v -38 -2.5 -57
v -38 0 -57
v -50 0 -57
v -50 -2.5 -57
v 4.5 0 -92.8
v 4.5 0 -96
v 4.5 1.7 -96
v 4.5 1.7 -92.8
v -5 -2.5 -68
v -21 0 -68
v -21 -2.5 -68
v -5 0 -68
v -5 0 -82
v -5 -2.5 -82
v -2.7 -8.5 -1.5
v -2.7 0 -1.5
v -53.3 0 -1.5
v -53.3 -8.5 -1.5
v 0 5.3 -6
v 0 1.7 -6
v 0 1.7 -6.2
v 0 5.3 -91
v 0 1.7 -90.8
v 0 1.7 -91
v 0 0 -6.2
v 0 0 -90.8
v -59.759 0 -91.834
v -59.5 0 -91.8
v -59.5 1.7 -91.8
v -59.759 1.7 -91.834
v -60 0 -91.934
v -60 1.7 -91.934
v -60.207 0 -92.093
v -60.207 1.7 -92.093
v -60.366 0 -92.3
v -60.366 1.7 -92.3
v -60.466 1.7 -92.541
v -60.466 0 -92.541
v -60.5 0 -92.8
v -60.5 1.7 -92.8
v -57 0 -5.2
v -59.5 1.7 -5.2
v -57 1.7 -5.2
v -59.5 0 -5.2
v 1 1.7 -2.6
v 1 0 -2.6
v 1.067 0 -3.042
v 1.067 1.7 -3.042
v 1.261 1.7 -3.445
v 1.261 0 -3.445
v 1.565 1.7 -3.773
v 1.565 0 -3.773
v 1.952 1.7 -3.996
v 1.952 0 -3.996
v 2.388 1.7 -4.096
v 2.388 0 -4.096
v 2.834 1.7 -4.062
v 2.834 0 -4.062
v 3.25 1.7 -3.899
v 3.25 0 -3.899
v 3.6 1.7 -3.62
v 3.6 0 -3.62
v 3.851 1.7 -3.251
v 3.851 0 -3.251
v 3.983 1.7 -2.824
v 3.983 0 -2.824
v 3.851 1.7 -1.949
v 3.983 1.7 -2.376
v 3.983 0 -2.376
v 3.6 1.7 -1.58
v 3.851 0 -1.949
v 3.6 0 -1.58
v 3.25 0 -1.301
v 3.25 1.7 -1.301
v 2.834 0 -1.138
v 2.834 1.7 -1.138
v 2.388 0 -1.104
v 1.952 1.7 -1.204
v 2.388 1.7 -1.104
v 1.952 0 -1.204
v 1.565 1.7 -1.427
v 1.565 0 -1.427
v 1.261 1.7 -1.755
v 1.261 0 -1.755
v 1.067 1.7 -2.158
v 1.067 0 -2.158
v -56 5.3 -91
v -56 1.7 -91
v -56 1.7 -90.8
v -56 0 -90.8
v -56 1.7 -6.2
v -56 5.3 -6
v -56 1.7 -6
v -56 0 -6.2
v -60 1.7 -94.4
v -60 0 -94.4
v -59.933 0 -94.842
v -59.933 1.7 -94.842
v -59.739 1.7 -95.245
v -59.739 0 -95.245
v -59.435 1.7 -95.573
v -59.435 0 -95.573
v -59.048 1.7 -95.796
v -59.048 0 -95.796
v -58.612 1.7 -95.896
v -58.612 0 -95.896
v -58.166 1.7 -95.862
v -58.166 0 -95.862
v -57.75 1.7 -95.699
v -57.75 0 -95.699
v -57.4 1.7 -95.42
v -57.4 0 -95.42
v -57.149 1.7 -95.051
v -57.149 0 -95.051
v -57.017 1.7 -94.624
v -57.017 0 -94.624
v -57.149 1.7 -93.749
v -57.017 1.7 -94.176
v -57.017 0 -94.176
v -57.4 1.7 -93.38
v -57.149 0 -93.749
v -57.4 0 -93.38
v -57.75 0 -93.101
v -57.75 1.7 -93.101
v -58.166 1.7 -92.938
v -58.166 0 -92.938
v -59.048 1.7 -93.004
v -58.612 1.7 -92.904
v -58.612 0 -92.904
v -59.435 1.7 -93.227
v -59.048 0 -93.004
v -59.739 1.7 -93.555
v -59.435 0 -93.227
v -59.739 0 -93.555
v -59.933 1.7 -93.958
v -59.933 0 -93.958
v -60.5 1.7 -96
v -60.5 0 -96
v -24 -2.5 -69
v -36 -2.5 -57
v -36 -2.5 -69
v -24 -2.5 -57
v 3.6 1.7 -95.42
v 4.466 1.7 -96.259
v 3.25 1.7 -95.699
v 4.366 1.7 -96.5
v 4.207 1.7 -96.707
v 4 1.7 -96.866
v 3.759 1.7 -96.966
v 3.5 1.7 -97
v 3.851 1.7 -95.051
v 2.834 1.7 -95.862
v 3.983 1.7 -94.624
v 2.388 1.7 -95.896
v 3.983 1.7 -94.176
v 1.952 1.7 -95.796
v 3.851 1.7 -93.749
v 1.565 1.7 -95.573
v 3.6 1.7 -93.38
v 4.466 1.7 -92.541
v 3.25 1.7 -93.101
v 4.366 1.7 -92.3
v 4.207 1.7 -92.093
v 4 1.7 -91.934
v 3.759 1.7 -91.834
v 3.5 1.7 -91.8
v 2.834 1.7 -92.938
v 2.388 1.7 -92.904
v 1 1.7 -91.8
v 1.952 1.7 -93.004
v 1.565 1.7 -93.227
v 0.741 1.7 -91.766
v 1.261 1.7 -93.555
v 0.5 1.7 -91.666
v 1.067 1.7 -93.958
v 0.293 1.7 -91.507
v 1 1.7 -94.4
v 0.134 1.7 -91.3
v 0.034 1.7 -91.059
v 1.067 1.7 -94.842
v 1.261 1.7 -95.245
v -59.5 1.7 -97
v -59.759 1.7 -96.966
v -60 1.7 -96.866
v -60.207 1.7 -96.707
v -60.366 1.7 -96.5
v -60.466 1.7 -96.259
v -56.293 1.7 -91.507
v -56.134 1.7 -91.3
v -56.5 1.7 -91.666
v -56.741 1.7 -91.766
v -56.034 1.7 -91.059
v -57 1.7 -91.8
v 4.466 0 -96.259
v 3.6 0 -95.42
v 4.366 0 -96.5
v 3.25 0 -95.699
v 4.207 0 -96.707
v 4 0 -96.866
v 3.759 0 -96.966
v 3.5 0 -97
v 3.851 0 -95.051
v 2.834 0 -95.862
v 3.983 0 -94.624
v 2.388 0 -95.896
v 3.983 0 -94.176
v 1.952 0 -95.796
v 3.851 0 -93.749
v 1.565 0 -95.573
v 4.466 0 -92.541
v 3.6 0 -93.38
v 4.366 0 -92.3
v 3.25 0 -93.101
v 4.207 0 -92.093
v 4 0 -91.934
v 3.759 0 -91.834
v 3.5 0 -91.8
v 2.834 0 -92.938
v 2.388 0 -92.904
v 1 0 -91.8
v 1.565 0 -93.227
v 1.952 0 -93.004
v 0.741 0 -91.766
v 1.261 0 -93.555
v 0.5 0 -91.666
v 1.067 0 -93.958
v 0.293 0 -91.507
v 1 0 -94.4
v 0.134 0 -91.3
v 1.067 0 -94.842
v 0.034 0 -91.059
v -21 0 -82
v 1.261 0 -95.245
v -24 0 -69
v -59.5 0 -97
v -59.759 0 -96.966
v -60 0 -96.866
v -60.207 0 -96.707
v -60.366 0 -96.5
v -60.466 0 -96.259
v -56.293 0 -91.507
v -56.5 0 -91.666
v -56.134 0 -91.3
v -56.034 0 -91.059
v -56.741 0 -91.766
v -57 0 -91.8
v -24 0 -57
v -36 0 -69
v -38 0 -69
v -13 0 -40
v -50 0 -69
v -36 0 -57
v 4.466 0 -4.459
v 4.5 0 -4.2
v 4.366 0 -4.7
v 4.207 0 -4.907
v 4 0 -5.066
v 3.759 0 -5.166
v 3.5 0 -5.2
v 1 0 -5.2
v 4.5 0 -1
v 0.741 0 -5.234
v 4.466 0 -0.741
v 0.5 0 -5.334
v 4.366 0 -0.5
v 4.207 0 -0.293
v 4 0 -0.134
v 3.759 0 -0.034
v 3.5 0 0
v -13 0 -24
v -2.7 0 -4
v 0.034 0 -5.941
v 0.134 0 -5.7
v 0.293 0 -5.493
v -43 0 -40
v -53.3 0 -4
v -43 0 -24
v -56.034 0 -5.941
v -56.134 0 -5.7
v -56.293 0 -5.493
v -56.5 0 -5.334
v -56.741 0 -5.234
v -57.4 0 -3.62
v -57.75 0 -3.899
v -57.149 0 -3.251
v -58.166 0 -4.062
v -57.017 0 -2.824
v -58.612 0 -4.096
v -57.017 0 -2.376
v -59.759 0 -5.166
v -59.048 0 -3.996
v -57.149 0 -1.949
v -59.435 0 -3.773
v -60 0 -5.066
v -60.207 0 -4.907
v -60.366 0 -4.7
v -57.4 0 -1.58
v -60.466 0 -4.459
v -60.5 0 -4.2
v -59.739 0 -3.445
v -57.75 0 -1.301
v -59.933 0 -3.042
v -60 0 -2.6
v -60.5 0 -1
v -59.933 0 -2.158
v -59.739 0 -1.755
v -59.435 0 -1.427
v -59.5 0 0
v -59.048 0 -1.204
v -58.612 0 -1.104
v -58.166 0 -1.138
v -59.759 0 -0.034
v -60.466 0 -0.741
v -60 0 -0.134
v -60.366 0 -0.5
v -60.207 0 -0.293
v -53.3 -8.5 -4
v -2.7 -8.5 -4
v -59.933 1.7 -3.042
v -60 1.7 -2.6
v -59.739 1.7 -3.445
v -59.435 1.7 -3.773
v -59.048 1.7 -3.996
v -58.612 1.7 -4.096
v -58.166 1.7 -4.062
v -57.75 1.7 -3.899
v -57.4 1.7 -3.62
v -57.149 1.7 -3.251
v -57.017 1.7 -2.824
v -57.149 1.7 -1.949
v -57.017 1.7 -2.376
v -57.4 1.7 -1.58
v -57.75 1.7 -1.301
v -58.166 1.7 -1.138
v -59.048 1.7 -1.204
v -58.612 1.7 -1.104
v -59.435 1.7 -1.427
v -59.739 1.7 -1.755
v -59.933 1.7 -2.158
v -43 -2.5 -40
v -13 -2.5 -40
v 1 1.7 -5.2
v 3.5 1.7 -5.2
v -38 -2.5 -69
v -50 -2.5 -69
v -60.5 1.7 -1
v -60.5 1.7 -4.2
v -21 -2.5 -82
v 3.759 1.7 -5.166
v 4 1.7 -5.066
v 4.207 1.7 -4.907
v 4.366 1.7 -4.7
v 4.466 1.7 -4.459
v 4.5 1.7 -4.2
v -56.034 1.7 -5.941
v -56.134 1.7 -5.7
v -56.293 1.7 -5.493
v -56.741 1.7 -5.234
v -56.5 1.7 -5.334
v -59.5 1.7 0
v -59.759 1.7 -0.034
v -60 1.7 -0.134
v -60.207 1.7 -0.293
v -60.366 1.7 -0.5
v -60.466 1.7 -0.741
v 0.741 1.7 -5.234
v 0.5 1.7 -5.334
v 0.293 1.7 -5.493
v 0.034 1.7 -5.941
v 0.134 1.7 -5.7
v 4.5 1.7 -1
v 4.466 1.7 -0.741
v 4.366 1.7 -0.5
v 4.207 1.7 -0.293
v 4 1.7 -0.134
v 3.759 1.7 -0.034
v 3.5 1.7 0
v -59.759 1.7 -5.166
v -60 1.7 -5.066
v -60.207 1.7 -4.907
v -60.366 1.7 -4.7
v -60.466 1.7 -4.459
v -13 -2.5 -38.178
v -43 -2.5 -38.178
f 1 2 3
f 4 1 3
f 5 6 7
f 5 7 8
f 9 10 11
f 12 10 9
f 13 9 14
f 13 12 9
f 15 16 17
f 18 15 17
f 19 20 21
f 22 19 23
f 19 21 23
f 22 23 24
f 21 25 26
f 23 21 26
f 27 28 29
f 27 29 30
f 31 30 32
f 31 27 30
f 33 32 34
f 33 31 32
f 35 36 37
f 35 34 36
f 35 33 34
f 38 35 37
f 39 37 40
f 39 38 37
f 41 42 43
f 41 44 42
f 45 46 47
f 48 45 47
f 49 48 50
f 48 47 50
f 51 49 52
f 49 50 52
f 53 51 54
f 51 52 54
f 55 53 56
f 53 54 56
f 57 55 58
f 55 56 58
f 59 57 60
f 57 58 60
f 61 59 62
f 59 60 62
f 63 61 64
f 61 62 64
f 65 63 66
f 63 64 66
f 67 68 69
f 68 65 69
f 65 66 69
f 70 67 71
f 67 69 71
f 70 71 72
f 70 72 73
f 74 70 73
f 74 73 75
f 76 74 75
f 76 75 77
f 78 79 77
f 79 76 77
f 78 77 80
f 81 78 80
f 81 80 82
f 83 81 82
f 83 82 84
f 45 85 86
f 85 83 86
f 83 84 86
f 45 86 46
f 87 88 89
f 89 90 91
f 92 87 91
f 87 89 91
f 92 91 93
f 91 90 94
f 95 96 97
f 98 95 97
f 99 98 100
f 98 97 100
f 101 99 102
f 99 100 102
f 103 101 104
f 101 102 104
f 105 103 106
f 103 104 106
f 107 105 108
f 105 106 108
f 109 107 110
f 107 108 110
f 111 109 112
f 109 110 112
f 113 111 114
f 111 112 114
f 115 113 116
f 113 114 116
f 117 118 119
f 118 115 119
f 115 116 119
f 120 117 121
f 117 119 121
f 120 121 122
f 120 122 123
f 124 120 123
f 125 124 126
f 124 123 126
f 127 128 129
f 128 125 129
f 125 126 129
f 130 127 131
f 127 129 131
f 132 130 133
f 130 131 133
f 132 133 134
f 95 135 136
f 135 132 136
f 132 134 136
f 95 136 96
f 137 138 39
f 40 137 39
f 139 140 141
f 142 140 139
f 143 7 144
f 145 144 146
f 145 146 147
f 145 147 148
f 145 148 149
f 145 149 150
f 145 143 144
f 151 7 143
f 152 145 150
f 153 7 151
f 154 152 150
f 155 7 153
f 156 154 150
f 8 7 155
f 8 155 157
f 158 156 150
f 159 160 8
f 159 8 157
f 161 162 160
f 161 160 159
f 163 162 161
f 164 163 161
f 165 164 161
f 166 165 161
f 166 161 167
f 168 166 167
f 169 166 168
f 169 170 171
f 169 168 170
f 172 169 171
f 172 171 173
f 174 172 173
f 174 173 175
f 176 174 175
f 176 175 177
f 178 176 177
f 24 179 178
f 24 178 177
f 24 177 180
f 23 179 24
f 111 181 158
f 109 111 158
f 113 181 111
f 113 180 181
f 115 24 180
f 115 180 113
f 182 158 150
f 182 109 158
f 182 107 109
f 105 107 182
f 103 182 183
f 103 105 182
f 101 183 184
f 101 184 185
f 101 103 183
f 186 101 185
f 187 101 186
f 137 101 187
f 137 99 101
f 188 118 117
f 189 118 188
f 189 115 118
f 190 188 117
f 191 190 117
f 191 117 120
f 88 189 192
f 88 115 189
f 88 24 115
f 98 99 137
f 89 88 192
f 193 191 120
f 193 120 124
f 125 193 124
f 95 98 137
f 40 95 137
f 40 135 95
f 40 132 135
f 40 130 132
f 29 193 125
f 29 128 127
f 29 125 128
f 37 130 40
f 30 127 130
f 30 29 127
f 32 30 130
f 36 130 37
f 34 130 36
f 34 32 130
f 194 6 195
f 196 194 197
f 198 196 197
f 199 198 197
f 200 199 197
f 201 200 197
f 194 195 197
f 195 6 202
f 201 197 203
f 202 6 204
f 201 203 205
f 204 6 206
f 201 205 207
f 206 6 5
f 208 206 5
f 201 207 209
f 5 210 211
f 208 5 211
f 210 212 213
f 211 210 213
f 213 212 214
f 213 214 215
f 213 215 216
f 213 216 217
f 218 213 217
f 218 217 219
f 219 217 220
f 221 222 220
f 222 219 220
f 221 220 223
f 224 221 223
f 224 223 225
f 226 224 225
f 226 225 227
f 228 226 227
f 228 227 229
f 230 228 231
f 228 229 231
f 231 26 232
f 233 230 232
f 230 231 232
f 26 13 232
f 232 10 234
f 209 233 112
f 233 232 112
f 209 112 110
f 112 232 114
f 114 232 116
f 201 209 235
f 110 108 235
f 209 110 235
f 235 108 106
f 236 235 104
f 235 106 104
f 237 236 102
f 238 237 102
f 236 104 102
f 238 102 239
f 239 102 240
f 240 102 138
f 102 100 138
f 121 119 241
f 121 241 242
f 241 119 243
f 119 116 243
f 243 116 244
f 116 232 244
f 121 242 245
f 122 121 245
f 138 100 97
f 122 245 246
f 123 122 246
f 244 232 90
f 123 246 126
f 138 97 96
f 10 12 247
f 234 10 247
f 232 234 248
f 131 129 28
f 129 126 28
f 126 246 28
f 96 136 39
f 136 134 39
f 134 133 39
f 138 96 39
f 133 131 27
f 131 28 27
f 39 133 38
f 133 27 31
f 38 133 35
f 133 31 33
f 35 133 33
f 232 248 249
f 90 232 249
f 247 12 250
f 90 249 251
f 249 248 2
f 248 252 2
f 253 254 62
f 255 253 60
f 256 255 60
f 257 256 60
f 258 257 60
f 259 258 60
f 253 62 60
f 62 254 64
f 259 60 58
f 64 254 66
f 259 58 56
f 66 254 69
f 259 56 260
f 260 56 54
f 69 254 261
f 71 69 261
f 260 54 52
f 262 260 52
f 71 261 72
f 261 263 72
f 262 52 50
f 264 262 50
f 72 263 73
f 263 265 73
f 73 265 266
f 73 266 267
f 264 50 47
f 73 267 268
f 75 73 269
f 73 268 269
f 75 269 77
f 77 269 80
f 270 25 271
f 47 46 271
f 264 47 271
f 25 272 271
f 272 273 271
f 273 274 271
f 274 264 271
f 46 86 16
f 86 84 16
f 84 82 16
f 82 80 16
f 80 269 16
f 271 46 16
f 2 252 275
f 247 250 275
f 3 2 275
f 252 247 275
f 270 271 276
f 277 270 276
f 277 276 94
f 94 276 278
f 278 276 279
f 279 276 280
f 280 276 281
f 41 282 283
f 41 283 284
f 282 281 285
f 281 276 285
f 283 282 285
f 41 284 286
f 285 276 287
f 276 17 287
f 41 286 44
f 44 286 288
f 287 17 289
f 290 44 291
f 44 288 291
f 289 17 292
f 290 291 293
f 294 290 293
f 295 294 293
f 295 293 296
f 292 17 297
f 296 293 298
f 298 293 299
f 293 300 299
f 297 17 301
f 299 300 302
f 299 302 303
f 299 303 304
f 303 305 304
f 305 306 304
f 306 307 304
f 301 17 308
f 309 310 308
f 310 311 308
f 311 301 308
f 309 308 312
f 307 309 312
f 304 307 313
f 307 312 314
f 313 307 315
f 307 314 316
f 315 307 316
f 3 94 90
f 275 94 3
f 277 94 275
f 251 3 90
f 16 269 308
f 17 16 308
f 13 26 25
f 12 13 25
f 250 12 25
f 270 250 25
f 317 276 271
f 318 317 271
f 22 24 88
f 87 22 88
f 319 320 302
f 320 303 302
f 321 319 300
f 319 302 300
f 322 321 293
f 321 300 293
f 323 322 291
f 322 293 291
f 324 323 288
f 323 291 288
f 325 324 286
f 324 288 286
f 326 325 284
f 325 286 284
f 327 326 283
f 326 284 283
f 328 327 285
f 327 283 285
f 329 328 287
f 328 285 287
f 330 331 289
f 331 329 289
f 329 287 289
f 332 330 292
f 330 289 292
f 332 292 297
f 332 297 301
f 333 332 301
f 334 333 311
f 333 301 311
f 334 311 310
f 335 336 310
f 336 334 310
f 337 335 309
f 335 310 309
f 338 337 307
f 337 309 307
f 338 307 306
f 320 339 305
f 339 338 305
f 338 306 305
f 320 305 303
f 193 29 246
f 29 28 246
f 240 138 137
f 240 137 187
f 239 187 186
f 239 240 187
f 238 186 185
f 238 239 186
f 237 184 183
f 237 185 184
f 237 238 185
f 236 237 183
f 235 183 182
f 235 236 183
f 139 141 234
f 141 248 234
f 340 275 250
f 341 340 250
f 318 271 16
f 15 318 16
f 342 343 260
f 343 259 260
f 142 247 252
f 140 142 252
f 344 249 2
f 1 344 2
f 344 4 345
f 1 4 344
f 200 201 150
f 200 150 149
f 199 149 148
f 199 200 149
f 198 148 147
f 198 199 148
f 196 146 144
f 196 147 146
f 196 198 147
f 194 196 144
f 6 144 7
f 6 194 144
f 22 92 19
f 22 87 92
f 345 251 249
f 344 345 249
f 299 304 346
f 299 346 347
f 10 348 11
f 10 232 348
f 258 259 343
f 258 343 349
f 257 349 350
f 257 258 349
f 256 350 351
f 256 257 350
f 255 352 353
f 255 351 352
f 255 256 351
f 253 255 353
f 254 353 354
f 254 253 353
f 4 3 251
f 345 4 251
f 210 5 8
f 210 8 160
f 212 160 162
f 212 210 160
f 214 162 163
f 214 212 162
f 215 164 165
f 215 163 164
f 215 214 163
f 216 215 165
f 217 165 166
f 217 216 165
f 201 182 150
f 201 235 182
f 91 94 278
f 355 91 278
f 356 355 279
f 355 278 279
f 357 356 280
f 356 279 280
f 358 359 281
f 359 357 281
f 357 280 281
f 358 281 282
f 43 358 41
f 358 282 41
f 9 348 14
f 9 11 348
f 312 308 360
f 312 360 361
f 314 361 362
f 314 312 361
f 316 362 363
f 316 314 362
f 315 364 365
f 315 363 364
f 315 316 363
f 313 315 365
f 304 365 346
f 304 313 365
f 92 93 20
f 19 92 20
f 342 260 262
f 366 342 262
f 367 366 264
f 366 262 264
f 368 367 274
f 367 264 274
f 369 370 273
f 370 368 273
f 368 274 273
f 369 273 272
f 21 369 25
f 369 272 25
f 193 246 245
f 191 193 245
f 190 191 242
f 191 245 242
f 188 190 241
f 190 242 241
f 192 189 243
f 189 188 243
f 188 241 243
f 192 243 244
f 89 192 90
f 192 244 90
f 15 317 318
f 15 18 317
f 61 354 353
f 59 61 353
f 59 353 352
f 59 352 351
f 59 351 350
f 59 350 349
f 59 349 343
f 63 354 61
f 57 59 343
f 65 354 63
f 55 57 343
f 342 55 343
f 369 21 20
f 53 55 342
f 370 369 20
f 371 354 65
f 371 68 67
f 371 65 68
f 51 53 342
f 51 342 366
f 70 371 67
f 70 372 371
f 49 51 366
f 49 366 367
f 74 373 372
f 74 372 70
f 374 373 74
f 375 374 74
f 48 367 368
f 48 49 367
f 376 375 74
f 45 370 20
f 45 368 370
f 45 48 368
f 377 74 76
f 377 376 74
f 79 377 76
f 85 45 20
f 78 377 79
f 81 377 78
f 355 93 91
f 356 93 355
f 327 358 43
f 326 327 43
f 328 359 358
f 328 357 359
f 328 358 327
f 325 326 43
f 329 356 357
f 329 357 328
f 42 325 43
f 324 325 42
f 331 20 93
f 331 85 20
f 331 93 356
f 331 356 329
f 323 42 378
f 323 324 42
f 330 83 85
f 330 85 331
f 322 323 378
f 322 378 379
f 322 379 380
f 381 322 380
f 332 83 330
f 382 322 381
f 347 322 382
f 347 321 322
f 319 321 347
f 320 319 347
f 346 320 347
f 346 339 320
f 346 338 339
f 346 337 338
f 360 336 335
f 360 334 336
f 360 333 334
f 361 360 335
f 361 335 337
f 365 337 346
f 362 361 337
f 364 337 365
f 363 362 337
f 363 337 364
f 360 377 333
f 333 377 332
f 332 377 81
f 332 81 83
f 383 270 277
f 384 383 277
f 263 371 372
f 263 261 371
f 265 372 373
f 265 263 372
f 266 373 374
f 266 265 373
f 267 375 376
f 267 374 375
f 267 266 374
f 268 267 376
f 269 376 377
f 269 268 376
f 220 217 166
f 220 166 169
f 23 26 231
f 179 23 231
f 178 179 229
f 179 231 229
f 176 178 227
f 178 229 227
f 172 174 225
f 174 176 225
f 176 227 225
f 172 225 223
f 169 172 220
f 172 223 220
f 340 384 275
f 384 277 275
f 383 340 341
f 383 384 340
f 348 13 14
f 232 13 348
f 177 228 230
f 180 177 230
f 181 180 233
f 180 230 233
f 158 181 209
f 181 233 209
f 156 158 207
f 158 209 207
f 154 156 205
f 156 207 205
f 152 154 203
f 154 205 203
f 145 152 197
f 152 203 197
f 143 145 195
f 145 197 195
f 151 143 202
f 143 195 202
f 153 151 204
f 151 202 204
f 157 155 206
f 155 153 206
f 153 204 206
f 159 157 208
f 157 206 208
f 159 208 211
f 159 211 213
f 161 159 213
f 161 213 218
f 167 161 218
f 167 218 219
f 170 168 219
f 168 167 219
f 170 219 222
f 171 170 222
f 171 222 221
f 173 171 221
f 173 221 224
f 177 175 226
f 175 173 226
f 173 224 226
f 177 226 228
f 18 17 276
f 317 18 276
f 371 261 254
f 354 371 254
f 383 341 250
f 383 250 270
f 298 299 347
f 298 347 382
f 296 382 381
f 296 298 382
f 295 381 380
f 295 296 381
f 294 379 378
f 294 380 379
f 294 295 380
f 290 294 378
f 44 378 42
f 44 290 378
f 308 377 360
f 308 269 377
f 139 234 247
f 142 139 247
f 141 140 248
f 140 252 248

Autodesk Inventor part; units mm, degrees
ref_plane "YZ Plane" through (0, 0, 0) normal (1, 0, 0) x (0, 1, 0)
ref_plane "XZ Plane" through (0, 0, 0) normal (0, 1, 0) x (-1, 0, 0)
ref_plane "XY Plane" through (0, 0, 0) normal (0, 0, 1) x (1, 0, 0)
sketch "Sketch1" plane through (0, 0, 0) normal (0, 1, 0) x (-1, 0, 0)
  line L0 (0, 0) -> (56, 0)
  line L1 (56, -6.2) -> (56, -90.8)
  line L2 (56, -97) -> (0, -97)
  line L3 (0, -90.8) -> (0, -6.2)
  line L4 (0, 0) -> (-3.5, 0)
  line L5 (-4.5, -1) -> (-4.5, -4.2)
  line L6 (-3.5, -5.2) -> (-1, -5.2)
  line L7 (28, 0) -> (28, -97)
  circle A0 centre (-2.5, -2.6) radius 1.5
  arc A1 (-3.5, 0) -> (-4.5, -1) centre (-3.5, -1) ccw
  arc A2 (-4.5, -4.2) -> (-3.5, -5.2) centre (-3.5, -4.2) ccw
  arc A3 (0, -6.2) -> (-1, -5.2) centre (-1, -6.2) ccw
  line L8 (56, 0) -> (59.5, 0)
  line L9 (60.5, -1) -> (60.5, -4.2)
  line L10 (59.5, -5.2) -> (57, -5.2)
  circle A4 centre (58.5, -2.6) radius 1.5
  arc A5 (60.5, -1) -> (59.5, 0) centre (59.5, -1) ccw
  arc A6 (59.5, -5.2) -> (60.5, -4.2) centre (59.5, -4.2) ccw
  arc A7 (57, -5.2) -> (56, -6.2) centre (57, -6.2) ccw
  line L11 (56, -48.5) -> (0, -48.5)
  line L12 (0, -97) -> (-3.5, -97)
  line L13 (-4.5, -96) -> (-4.5, -92.8)
  line L14 (-3.5, -91.8) -> (-1, -91.8)
  circle A8 centre (-2.5, -94.4) radius 1.5
  arc A9 (-4.5, -96) -> (-3.5, -97) centre (-3.5, -96) ccw
  arc A10 (-3.5, -91.8) -> (-4.5, -92.8) centre (-3.5, -92.8) ccw
  arc A11 (-1, -91.8) -> (0, -90.8) centre (-1, -90.8) ccw
  arc A12 (56, -90.8) -> (57, -91.8) centre (57, -90.8) ccw
  line L15 (59.5, -91.8) -> (57, -91.8)
  line L16 (56, -97) -> (59.5, -97)
  circle A13 centre (58.5, -94.4) radius 1.5
  arc A14 (60.5, -92.8) -> (59.5, -91.8) centre (59.5, -92.8) ccw
  line L17 (60.5, -96) -> (60.5, -92.8)
  arc A15 (59.5, -97) -> (60.5, -96) centre (59.5, -96) ccw
  point P0 (-4.5, 0)
  point P1 (-4.5, -5.2)
  point P2 (0, -5.2)
  point P3 (60.5, 0)
  point P4 (60.5, -5.2)
  point P5 (56, -5.2)
  point P6 (-4.5, -97)
  point P7 (-4.5, -91.8)
  point P8 (0, -91.8)
  point P9 (56, -91.8)
  point P10 (60.5, -91.8)
  point P11 (60.5, -97)
  dimension "d0" = 56
  dimension "d1" = 97
  dimension "d2" = 4.5
  dimension "d3" = 5.2
  dimension "d10" = 1
  dimension "d11" = 1
  dimension "d12" = 2
  dimension "d13" = 2.6
  dimension "d14" = 3
  dimension "d15" = 56
extrude "Vetronite" add sketch "Sketch1" along normal blind 1.7
sketch "Sketch2" plane through (0, 1.7, 0) normal (0, 1, 0) x (1, 0, 0)
  line L0 (-59.5, 0) -> (3.5, 0) projected
  line L1 (-28, 0) -> (-28, 97)
  line L2 (3.5, 97) -> (-59.5, 97) projected
  line L3 (-56, 90.8) -> (-56, 6.2) projected
  line L4 (-56, 48.5) -> (0, 48.5)
  line L5 (0, 6.2) -> (0, 90.8) projected
  line L6 (-56, 6) -> (0, 6)
  line L7 (0, 6) -> (0, 91)
  line L8 (0, 91) -> (-56, 91)
  line L9 (-56, 91) -> (-56, 6)
  point P0 (0, 0)
  point P1 (-56, 6.2)
  dimension "d16" = 85
  dimension "d17" = 56
extrude "Display" add sketch "Sketch2" along normal blind 3.6
sketch "Sketch3" plane through (0, 0, 0) normal (0, -1, 0) x (1, 0, 0)
  line L0 (-53.3, -4) -> (-2.7, -4)
  line L1 (-2.7, -4) -> (-2.7, -1.5)
  line L2 (-2.7, -1.5) -> (-53.3, -1.5)
  line L3 (-53.3, -1.5) -> (-53.3, -4)
  line L4 (-59.5, 0) -> (3.5, 0) projected
  line L5 (3.5, -97) -> (-59.5, -97) projected
  line L6 (-28, -97) -> (-28, 0)
  line L7 (-59.5, 0) -> (3.5, 0) projected
  point P0 (0, 0)
  dimension "d20" = 50.6
  dimension "d21" = 2.5
  dimension "d22" = 1.5
extrude "Pin" add sketch "Sketch3" along normal blind 8.5
sketch "Sketch4" plane through (0, 0, 0) normal (0, -1, 0) x (1, 0, 0)
  line L0 (-5, -82) -> (-21, -82)
  line L1 (-21, -82) -> (-21, -68)
  line L2 (-21, -68) -> (-5, -68)
  line L3 (-5, -68) -> (-5, -82)
  line L4 (-50, -69) -> (-38, -69)
  line L5 (-38, -69) -> (-38, -57)
  line L6 (-38, -57) -> (-50, -57)
  line L7 (-50, -57) -> (-50, -69)
  line L8 (-36, -69) -> (-24, -69)
  line L9 (-24, -69) -> (-24, -57)
  line L10 (-24, -57) -> (-36, -57)
  line L11 (-36, -57) -> (-36, -69)
  line L12 (-43, -40) -> (-13, -40)
  line L13 (-13, -40) -> (-13, -24)
  line L14 (-13, -24) -> (-43, -24)
  line L15 (-43, -24) -> (-43, -40)
  line L16 (3.5, -97) -> (-59.5, -97) projected
  line L17 (0, -6.2) -> (0, -90.8) projected
  line L18 (-56, -90.8) -> (-56, -6.2) projected
  point P0 (0, 0)
  dimension "d25" = 16
  dimension "d26" = 14
  dimension "d27" = 12
  dimension "d28" = 12
  dimension "d29" = 12
  dimension "d30" = 12
  dimension "d31" = 30
  dimension "d32" = 16
  dimension "d33" = 15
  dimension "d34" = 5
  dimension "d35" = 28
  dimension "d36" = 6
  dimension "d37" = 2
  dimension "d38" = 57
  dimension "d40" = 13
extrude "Componenti" add sketch "Sketch4" along normal blind 2.5
draft "ScreenCables" angle 80 pull direction (0, -1, 0) faces at (-23, -0.8333, -24) fixed edges at (-28, 0, -24)
properties part number "TouchLCD" material "Lead"
